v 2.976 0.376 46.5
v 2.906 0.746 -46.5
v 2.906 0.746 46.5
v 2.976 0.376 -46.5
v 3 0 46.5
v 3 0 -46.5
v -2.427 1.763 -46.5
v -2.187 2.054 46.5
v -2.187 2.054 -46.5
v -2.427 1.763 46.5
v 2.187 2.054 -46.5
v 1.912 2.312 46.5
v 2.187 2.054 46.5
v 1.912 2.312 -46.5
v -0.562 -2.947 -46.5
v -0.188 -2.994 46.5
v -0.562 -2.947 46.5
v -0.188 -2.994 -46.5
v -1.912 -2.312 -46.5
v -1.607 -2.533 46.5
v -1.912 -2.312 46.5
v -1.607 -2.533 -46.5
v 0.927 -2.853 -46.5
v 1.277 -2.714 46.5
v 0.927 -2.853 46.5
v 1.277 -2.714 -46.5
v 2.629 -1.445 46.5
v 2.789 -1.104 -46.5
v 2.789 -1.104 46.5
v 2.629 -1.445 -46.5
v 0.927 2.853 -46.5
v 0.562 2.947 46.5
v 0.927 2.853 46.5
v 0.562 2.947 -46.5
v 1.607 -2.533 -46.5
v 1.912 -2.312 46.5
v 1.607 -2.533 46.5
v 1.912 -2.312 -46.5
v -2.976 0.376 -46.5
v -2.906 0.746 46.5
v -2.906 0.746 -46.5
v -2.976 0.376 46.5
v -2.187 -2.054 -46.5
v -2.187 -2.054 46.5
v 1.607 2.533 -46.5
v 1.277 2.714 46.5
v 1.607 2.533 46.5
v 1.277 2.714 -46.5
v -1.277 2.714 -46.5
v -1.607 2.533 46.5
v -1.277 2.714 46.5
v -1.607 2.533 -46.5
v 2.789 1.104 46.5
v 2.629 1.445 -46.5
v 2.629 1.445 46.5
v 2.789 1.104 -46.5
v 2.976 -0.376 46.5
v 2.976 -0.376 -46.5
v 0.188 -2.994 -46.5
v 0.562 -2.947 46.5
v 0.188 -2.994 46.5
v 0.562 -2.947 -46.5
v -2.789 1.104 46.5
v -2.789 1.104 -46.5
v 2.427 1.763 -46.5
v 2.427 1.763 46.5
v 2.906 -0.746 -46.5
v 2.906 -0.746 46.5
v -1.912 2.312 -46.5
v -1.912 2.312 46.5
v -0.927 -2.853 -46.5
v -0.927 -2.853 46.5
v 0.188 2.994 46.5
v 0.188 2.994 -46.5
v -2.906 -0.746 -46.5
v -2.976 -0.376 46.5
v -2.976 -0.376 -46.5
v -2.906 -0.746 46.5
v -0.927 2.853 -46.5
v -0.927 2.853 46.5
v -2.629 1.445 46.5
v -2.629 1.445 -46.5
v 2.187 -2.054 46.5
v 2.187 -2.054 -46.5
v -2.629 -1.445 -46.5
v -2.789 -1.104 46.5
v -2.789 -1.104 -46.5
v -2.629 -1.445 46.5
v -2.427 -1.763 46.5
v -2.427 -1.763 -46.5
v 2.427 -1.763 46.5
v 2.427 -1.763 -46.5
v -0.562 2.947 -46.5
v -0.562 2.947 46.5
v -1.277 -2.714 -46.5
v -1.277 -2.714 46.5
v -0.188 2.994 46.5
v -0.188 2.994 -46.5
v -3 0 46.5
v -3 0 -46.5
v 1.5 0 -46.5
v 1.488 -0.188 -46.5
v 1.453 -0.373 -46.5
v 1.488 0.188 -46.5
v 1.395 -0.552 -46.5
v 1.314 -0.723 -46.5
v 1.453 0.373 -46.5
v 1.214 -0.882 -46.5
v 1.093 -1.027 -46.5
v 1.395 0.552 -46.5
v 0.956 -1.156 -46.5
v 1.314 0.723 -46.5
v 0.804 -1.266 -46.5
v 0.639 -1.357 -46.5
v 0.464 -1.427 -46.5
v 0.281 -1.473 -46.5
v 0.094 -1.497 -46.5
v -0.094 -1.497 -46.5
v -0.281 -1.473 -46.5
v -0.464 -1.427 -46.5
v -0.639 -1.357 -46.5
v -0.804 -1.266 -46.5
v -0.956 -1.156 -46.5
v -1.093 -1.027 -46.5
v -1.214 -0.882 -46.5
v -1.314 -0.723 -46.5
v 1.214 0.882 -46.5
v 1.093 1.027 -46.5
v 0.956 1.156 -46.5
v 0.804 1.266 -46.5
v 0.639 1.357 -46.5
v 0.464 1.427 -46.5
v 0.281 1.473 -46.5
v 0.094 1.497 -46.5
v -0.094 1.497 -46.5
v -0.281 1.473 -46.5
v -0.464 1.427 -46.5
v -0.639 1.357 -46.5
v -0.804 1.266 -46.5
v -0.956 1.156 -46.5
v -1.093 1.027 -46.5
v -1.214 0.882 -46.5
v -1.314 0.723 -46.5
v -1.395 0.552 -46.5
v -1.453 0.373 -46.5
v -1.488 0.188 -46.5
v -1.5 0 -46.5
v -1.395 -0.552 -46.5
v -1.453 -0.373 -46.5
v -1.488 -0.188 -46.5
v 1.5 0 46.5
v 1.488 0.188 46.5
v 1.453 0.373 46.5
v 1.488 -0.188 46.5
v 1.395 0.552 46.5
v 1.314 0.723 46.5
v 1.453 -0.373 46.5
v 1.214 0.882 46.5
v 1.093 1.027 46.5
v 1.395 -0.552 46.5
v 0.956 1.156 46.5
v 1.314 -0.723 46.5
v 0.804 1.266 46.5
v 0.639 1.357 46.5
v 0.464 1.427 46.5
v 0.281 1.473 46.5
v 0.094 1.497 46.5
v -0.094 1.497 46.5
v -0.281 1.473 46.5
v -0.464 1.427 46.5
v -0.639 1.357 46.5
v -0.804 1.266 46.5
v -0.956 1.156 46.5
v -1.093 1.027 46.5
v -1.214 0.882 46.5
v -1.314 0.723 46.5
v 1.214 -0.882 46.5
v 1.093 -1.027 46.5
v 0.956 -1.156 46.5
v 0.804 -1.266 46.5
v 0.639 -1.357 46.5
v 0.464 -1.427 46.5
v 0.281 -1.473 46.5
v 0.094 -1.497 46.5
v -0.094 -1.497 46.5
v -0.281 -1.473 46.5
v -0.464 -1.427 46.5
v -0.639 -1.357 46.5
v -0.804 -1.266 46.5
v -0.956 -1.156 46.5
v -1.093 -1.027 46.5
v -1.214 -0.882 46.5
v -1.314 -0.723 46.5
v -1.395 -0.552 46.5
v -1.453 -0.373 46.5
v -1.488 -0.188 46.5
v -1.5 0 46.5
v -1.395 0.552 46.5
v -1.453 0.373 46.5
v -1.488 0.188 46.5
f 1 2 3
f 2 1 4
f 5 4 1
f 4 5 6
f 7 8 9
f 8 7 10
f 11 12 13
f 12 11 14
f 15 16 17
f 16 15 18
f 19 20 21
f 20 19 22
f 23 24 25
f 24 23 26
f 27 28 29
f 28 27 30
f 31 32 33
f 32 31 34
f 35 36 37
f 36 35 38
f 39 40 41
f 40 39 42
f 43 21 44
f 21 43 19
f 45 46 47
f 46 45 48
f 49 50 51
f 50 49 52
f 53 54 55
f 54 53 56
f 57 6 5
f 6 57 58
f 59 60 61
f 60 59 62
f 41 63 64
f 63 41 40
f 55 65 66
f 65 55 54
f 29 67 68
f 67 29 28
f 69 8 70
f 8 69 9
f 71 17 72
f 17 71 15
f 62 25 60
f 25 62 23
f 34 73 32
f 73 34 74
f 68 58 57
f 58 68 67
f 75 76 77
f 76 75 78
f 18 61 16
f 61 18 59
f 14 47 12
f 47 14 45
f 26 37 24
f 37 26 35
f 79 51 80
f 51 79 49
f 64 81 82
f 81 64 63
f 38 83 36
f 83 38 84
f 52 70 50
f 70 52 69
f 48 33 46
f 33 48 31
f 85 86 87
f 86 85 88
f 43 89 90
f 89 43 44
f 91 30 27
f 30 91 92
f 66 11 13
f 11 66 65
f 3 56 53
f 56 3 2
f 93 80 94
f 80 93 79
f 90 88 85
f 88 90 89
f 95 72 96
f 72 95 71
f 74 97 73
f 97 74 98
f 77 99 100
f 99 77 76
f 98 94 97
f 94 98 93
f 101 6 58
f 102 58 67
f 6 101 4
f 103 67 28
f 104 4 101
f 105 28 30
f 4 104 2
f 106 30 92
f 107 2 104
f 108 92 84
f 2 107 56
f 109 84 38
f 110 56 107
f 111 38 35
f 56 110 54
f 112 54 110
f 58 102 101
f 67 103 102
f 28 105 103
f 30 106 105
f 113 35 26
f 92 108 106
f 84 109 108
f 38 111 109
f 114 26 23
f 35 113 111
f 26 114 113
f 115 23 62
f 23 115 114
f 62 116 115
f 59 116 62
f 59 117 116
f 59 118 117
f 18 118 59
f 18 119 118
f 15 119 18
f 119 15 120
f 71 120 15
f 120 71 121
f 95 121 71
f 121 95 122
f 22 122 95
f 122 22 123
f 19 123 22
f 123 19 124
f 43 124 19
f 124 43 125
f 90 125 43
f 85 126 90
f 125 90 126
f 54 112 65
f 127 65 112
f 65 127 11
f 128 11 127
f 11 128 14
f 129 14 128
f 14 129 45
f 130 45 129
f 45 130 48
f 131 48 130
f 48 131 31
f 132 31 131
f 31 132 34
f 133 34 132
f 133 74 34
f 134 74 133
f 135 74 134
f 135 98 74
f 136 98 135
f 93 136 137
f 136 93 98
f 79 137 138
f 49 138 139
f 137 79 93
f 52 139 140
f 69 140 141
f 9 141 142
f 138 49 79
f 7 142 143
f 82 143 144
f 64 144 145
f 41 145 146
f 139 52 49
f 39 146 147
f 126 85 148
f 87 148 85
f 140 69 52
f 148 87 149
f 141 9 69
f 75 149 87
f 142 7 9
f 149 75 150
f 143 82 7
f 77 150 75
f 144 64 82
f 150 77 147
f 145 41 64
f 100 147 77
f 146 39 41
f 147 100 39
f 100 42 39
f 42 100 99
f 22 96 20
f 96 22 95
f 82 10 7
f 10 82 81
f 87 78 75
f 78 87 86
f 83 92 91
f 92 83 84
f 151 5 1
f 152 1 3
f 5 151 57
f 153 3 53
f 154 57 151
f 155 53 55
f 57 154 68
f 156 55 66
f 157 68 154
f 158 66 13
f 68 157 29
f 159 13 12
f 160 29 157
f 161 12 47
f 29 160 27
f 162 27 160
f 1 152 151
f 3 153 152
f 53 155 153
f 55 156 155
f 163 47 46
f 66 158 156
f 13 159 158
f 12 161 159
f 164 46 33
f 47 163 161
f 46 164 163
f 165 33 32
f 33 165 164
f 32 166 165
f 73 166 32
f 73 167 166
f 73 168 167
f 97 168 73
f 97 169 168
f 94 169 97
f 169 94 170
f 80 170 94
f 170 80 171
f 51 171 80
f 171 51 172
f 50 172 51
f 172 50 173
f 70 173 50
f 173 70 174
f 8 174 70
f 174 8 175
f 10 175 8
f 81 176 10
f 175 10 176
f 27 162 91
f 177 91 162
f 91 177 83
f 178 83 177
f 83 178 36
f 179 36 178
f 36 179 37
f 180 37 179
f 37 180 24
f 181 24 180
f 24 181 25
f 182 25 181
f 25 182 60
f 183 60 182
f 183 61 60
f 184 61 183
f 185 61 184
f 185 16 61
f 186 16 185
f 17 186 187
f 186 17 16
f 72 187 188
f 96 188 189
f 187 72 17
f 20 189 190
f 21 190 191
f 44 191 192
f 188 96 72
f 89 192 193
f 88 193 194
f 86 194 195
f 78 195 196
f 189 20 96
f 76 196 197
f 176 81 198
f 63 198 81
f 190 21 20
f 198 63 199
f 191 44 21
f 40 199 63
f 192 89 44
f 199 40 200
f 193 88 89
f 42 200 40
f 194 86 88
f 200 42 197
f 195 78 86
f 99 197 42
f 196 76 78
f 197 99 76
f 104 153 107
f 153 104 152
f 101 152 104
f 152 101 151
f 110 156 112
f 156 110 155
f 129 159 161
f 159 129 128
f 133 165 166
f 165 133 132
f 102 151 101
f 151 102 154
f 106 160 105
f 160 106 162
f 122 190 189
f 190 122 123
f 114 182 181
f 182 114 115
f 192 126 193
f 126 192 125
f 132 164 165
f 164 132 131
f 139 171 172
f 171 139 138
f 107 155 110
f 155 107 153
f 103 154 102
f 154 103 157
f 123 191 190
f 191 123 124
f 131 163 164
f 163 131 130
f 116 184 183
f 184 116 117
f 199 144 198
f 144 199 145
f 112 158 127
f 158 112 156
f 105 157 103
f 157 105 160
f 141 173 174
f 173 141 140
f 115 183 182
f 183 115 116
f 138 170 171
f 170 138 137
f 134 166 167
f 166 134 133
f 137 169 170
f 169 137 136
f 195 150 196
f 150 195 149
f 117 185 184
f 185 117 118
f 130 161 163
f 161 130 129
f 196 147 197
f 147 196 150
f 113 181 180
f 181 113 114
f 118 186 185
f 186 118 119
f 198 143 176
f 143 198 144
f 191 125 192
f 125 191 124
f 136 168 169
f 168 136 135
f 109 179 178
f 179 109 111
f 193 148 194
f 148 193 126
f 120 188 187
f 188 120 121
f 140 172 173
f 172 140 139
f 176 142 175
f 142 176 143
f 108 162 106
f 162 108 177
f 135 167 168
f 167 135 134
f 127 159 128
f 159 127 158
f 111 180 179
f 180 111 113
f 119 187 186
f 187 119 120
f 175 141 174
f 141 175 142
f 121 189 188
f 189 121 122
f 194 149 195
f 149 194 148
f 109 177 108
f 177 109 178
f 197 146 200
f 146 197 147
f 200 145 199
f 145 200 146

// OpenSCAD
$fn = 50;


difference() {
	union() {
		translate(v = [0, 0, -46.5000000000]) {
			cylinder(h = 93, r = 3.0000000000);
		}
	}
	union() {
		translate(v = [0, 0, -100.0000000000]) {
			cylinder(h = 200, r = 1.5000000000);
		}
	}
}
